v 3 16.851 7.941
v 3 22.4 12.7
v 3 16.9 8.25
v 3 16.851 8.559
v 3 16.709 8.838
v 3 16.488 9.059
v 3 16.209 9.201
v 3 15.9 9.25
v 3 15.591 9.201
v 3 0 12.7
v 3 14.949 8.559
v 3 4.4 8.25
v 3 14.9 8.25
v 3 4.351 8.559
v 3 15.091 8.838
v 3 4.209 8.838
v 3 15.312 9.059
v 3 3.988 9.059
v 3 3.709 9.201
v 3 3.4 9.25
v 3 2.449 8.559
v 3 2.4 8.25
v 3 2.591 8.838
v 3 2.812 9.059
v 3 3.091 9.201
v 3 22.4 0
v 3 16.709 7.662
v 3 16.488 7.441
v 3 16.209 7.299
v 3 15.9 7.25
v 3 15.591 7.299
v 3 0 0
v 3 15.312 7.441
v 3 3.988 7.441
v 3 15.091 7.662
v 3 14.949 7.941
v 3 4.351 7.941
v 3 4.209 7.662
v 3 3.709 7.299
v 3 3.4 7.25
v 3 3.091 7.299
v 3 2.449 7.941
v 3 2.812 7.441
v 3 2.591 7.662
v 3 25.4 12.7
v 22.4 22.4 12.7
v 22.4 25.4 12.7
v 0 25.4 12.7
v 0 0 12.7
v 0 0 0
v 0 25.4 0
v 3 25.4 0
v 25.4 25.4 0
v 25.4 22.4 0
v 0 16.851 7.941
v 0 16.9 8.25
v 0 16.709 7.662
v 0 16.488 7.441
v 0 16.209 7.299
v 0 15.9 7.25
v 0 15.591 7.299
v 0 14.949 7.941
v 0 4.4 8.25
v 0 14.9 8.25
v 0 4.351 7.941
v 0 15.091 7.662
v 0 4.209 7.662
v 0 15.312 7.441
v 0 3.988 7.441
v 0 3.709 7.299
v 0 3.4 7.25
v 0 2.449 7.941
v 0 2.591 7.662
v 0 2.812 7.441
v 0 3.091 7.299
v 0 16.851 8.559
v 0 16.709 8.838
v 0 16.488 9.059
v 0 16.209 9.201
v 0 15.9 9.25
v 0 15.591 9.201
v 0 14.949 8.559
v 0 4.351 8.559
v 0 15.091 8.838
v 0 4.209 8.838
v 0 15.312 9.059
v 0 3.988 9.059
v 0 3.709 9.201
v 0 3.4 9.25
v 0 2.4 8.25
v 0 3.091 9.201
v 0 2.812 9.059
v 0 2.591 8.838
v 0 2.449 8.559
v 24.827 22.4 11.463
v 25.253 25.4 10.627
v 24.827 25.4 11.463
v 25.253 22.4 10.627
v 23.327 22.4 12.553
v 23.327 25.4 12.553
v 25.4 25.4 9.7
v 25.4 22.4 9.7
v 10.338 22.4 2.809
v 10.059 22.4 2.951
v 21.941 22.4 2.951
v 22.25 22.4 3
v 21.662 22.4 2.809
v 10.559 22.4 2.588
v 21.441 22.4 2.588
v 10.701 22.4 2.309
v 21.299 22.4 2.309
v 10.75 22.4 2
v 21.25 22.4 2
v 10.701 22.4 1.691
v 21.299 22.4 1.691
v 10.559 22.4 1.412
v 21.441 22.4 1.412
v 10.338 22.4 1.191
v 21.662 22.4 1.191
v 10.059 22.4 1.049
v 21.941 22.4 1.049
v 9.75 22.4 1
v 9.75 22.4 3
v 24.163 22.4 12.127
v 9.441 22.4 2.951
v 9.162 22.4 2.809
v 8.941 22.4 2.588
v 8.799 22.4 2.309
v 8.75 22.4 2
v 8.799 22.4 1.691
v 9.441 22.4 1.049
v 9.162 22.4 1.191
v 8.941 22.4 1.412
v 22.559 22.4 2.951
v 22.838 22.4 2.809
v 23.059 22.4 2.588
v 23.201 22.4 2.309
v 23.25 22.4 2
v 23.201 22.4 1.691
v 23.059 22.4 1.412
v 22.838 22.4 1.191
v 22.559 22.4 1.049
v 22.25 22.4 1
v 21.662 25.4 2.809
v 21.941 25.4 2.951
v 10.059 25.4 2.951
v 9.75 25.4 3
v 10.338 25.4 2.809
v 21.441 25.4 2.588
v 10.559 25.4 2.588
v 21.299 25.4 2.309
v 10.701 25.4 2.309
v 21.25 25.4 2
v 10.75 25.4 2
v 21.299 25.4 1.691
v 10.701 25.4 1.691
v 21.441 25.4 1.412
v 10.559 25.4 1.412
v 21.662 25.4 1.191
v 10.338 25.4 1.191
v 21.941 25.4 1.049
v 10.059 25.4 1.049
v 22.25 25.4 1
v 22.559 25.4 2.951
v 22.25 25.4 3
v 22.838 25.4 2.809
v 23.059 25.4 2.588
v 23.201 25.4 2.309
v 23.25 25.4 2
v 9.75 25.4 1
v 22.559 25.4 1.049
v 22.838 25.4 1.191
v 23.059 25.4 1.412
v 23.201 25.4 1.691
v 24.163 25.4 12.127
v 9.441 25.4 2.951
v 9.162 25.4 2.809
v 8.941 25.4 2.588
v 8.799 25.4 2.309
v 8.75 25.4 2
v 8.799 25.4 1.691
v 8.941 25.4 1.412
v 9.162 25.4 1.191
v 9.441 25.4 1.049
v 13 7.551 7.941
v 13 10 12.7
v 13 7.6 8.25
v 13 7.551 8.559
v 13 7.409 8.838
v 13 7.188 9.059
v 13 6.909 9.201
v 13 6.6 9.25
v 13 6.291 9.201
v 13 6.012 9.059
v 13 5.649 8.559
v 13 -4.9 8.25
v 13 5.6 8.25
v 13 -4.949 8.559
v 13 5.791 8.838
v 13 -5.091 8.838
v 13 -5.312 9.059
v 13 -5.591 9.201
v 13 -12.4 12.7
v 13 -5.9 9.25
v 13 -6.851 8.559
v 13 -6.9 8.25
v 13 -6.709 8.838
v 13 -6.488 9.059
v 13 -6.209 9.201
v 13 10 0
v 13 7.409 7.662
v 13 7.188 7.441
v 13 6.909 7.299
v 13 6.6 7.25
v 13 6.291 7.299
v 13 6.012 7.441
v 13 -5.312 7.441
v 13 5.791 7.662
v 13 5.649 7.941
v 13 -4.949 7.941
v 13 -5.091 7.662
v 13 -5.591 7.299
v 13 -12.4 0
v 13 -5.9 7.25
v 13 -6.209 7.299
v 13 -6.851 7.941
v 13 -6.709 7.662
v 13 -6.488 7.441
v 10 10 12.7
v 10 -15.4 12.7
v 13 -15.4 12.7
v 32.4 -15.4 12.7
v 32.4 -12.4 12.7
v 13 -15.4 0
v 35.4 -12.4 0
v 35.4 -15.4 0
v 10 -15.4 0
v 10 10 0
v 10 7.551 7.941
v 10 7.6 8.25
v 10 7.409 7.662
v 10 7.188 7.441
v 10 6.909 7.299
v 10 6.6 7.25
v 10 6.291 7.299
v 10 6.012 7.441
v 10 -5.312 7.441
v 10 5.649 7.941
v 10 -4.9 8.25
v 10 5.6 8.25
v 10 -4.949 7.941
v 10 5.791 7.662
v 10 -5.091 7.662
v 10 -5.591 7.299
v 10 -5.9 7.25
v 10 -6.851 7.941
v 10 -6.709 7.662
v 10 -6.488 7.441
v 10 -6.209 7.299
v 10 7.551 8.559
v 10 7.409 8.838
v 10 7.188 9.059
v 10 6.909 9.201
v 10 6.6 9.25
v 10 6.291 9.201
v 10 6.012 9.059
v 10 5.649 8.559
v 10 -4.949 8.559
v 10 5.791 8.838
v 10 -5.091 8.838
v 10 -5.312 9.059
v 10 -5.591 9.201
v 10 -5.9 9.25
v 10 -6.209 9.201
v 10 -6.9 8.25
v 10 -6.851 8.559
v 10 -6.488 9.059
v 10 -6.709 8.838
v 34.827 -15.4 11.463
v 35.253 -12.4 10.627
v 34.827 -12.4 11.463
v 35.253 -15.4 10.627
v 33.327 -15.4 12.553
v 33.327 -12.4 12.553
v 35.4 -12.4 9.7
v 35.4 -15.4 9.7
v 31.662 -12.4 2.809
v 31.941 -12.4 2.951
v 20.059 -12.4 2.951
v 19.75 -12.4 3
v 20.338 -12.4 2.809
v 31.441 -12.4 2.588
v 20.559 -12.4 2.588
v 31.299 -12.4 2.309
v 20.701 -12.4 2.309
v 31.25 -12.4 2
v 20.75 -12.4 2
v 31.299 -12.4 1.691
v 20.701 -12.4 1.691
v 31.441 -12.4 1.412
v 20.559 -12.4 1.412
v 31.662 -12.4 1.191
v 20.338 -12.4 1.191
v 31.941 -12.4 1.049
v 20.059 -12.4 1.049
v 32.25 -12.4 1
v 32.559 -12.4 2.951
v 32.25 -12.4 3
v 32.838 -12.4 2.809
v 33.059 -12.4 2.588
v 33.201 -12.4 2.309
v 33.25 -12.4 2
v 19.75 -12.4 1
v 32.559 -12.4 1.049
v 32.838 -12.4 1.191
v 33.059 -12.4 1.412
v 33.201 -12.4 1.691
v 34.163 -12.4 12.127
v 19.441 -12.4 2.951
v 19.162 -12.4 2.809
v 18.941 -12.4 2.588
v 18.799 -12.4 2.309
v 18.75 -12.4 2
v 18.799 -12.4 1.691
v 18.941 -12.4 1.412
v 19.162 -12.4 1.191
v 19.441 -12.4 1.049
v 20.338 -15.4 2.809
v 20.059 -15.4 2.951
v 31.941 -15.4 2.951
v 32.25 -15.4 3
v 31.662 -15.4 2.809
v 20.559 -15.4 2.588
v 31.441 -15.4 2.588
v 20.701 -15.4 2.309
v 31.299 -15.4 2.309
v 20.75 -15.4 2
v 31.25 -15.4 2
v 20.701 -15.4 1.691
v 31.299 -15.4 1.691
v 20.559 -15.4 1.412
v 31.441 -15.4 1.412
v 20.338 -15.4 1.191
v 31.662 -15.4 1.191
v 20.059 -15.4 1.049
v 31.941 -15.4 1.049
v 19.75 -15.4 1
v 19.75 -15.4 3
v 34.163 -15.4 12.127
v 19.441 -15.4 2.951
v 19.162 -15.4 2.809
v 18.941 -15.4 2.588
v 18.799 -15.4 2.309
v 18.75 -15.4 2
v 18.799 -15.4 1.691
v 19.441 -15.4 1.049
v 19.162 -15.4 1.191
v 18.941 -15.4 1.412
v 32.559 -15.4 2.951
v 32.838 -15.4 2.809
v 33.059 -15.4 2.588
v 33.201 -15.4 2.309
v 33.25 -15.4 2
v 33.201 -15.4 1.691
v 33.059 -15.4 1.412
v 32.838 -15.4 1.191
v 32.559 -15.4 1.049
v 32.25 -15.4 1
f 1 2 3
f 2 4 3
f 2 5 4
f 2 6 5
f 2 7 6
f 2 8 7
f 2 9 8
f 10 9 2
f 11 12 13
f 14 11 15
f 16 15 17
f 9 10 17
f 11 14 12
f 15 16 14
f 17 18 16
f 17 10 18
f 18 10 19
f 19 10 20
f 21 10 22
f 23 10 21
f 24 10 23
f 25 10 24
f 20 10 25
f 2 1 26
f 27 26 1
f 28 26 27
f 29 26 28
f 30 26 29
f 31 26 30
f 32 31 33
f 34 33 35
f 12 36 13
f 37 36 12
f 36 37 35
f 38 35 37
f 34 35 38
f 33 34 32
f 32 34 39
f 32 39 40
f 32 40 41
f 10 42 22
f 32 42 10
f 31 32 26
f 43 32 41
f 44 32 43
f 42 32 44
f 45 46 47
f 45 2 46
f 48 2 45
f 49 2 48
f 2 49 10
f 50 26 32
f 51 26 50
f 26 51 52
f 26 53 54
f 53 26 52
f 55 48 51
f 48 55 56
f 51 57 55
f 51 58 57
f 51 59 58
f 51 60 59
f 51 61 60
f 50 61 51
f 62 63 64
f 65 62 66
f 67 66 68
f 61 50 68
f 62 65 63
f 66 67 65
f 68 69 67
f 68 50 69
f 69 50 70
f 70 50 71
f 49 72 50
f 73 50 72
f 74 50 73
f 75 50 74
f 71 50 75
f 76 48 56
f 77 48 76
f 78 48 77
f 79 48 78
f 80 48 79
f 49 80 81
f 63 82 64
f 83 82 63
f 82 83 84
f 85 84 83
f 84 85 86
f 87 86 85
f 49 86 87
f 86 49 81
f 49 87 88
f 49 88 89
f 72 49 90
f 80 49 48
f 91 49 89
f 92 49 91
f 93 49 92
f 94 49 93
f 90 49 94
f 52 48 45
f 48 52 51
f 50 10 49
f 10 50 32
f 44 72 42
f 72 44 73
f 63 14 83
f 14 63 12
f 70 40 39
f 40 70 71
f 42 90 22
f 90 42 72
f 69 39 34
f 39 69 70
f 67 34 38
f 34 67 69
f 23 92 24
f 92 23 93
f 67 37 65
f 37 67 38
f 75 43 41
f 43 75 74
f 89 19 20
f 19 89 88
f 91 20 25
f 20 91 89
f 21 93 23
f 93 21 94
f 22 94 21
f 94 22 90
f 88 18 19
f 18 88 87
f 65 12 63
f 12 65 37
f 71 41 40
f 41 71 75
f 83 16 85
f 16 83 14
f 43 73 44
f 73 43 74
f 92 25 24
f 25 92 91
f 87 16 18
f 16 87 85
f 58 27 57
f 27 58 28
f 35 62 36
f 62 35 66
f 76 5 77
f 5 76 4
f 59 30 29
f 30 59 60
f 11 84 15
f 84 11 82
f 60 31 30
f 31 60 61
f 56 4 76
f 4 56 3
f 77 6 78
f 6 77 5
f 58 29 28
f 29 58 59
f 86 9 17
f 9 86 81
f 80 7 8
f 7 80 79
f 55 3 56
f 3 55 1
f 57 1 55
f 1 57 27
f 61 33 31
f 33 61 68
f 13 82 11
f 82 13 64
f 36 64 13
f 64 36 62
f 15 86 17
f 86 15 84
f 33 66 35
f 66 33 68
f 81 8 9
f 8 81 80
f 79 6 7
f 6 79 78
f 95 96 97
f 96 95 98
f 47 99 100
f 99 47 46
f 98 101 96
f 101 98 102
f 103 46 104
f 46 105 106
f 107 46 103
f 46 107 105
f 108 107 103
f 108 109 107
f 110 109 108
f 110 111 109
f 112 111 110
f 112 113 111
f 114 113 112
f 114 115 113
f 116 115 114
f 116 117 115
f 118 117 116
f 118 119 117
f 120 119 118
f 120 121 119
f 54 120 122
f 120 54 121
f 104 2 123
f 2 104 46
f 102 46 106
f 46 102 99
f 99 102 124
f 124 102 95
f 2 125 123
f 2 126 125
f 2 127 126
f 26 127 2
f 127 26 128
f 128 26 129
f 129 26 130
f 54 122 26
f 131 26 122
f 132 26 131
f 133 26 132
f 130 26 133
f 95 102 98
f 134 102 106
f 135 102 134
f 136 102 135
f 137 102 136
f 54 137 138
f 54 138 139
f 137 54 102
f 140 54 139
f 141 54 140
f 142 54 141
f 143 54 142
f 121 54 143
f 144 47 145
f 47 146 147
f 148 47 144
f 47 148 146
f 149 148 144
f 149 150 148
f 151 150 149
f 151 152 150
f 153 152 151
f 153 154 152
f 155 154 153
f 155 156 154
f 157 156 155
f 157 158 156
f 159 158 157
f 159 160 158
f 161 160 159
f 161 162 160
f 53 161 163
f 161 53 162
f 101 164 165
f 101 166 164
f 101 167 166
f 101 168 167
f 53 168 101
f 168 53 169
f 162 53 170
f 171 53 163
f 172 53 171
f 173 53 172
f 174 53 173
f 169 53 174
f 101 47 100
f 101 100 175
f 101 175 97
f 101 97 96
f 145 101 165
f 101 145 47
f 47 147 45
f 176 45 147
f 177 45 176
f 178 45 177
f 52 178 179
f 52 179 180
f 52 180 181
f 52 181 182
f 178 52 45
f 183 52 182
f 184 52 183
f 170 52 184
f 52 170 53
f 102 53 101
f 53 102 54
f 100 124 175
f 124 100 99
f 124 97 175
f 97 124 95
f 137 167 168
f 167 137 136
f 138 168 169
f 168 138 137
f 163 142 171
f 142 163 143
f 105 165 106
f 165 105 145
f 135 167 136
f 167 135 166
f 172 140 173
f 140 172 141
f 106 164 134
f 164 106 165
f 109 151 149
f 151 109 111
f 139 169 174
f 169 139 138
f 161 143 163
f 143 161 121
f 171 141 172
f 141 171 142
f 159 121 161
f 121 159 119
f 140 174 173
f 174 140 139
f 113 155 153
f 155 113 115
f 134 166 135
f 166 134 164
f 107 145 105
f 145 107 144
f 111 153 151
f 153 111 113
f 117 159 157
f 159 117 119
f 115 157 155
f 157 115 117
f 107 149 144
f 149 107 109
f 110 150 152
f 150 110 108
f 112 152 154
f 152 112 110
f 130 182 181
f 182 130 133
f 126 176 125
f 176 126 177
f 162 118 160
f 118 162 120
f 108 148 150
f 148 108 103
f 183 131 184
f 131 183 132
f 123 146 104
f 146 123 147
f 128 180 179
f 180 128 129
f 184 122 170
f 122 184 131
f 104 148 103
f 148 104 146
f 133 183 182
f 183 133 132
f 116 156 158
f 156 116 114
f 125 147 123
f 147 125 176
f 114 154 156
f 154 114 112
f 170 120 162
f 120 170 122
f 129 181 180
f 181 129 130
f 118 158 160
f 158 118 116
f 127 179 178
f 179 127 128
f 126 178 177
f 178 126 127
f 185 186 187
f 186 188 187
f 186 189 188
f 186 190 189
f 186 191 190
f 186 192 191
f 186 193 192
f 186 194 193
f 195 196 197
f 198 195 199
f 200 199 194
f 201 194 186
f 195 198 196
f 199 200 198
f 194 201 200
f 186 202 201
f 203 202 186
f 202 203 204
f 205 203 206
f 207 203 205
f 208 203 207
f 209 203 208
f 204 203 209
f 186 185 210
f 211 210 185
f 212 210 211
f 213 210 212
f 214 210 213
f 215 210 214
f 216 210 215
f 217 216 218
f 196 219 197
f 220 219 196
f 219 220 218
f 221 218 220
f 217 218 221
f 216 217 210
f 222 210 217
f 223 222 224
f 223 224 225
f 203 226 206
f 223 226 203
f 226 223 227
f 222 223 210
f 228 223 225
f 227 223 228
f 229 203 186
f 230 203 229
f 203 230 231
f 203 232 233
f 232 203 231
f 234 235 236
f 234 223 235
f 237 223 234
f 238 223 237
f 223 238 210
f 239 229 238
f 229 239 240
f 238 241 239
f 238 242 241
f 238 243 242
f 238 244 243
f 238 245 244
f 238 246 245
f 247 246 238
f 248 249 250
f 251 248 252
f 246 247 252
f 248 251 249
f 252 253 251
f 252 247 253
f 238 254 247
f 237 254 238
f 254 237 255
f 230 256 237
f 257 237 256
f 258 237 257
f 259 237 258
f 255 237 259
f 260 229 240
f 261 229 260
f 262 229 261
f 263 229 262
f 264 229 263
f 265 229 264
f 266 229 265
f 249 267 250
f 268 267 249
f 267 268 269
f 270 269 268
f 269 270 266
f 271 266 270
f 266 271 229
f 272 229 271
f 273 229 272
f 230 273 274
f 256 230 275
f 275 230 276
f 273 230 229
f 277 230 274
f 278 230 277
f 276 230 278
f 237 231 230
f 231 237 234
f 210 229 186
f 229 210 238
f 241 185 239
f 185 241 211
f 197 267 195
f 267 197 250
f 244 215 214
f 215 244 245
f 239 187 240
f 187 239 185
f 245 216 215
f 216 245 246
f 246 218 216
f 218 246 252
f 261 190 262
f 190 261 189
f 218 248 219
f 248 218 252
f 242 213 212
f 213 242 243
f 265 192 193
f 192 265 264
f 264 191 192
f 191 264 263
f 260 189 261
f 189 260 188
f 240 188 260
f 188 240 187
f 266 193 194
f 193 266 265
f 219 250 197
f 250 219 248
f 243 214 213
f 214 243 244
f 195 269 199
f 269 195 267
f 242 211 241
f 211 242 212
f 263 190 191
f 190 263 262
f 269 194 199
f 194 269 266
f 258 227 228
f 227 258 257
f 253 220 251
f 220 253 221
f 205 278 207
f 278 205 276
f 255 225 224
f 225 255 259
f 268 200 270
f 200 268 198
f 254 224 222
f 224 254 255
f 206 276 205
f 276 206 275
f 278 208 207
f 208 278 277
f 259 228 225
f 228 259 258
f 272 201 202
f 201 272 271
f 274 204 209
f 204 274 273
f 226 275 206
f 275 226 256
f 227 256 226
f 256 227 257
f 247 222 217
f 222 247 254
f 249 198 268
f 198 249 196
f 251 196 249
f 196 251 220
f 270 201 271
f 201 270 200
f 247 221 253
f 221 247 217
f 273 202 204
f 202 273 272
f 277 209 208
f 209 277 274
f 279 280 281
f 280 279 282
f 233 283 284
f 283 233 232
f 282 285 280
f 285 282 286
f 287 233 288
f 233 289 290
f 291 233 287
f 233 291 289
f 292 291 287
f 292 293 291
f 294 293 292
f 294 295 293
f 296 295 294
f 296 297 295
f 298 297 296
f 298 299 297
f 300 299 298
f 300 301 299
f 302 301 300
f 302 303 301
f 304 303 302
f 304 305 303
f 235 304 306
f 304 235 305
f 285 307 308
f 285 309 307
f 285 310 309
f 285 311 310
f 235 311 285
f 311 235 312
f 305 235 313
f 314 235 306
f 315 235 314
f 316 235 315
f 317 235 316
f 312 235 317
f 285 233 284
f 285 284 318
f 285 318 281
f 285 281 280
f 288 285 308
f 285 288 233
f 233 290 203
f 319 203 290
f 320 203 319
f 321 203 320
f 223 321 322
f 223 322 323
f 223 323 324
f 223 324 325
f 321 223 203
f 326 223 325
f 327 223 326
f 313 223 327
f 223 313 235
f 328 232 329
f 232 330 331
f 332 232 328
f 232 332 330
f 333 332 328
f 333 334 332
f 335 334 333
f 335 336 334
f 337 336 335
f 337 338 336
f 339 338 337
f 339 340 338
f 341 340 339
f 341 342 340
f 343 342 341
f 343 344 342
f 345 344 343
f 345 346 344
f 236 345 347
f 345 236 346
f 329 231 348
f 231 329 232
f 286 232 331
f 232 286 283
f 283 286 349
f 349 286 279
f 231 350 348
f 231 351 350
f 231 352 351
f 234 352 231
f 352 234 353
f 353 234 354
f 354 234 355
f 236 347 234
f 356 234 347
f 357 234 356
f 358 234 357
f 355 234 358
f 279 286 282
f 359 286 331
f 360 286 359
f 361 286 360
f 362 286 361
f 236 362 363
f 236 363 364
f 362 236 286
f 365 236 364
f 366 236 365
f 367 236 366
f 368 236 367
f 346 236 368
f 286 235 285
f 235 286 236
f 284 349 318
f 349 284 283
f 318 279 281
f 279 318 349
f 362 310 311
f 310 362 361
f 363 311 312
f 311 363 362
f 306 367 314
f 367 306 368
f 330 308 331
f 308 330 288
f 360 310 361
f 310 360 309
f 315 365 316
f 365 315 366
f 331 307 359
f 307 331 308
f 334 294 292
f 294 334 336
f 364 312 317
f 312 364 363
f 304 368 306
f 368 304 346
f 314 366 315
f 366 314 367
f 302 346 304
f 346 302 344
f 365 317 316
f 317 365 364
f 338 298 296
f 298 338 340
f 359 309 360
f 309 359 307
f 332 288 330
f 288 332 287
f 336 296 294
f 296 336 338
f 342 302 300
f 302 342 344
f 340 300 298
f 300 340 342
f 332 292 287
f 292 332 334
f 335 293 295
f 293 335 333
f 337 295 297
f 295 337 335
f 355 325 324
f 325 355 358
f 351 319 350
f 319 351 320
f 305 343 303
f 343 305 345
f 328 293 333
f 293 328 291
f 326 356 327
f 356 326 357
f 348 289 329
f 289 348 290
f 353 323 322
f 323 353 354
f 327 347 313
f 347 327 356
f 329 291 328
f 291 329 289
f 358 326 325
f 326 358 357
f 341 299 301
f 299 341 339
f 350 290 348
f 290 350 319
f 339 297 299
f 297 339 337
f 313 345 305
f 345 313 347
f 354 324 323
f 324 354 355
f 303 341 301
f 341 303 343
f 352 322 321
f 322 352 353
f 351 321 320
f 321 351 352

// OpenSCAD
//BipedBrackets

//variables
xBack = 3;
yBack = 25.4;
zBack = 12.7;

xSide = 22.4;
ySide = 3;
zSide = 12.7;

cornerSize = xSide - 16.4;

holesD = 2;
holesH = xBack+1;

backHolesZPosition = 7.25 + holesD/2;

sideHolesXPosition1 = 2.15;
sideHolesXPosition2 = 14.65;
sideHolesZPosition = 2;

//modules
module bipedBrackets(){
    oneBipedBracket();
    mirror([0,1,0])        
        translate([10, -10, 0])
            oneBipedBracket();
}

module oneBipedBracket(){
    union(){
        back();
        translate([xBack,yBack-ySide,0])
            side();
    }
}

module back(){
    difference(){
        platform(xBack, yBack, zBack);
        translate([xBack/2,2.4+holesD/2,backHolesZPosition])
            backHole();
        translate([xBack/2,14.9+holesD/2,backHolesZPosition])
            backHole();
    }   
}

module side(){
    difference(){
        sideWall();
        translate([xSide-sideHolesXPosition1-holesD/2,ySide/2,sideHolesZPosition])
            sideHole();
        translate([xSide-sideHolesXPosition2-holesD/2,ySide/2,sideHolesZPosition])
            sideHole();
    }
    
}

module sideWall(){
    hull(){
        platform(xSide, ySide, zSide/2);
        platform(xSide/2, ySide, zSide);
        translate([xSide-cornerSize/2,ySide/2,zSide-cornerSize/2])
            rotate([90,0,0])
                cylinder(h=ySide, d=cornerSize, center=true, $fn=20);
    }
}

module sideHole(){
    rotate([90,0,0])
        cylinder(h=holesH, d=holesD, center=true, $fn=20);
}

module backHole(){
    rotate([0,90,0])
        cylinder(h=holesH, d=holesD, center=true, $fn=20);
}

module platform(x, y, z){
    cube([x,y,z]);
}

//invocation
bipedBrackets();
